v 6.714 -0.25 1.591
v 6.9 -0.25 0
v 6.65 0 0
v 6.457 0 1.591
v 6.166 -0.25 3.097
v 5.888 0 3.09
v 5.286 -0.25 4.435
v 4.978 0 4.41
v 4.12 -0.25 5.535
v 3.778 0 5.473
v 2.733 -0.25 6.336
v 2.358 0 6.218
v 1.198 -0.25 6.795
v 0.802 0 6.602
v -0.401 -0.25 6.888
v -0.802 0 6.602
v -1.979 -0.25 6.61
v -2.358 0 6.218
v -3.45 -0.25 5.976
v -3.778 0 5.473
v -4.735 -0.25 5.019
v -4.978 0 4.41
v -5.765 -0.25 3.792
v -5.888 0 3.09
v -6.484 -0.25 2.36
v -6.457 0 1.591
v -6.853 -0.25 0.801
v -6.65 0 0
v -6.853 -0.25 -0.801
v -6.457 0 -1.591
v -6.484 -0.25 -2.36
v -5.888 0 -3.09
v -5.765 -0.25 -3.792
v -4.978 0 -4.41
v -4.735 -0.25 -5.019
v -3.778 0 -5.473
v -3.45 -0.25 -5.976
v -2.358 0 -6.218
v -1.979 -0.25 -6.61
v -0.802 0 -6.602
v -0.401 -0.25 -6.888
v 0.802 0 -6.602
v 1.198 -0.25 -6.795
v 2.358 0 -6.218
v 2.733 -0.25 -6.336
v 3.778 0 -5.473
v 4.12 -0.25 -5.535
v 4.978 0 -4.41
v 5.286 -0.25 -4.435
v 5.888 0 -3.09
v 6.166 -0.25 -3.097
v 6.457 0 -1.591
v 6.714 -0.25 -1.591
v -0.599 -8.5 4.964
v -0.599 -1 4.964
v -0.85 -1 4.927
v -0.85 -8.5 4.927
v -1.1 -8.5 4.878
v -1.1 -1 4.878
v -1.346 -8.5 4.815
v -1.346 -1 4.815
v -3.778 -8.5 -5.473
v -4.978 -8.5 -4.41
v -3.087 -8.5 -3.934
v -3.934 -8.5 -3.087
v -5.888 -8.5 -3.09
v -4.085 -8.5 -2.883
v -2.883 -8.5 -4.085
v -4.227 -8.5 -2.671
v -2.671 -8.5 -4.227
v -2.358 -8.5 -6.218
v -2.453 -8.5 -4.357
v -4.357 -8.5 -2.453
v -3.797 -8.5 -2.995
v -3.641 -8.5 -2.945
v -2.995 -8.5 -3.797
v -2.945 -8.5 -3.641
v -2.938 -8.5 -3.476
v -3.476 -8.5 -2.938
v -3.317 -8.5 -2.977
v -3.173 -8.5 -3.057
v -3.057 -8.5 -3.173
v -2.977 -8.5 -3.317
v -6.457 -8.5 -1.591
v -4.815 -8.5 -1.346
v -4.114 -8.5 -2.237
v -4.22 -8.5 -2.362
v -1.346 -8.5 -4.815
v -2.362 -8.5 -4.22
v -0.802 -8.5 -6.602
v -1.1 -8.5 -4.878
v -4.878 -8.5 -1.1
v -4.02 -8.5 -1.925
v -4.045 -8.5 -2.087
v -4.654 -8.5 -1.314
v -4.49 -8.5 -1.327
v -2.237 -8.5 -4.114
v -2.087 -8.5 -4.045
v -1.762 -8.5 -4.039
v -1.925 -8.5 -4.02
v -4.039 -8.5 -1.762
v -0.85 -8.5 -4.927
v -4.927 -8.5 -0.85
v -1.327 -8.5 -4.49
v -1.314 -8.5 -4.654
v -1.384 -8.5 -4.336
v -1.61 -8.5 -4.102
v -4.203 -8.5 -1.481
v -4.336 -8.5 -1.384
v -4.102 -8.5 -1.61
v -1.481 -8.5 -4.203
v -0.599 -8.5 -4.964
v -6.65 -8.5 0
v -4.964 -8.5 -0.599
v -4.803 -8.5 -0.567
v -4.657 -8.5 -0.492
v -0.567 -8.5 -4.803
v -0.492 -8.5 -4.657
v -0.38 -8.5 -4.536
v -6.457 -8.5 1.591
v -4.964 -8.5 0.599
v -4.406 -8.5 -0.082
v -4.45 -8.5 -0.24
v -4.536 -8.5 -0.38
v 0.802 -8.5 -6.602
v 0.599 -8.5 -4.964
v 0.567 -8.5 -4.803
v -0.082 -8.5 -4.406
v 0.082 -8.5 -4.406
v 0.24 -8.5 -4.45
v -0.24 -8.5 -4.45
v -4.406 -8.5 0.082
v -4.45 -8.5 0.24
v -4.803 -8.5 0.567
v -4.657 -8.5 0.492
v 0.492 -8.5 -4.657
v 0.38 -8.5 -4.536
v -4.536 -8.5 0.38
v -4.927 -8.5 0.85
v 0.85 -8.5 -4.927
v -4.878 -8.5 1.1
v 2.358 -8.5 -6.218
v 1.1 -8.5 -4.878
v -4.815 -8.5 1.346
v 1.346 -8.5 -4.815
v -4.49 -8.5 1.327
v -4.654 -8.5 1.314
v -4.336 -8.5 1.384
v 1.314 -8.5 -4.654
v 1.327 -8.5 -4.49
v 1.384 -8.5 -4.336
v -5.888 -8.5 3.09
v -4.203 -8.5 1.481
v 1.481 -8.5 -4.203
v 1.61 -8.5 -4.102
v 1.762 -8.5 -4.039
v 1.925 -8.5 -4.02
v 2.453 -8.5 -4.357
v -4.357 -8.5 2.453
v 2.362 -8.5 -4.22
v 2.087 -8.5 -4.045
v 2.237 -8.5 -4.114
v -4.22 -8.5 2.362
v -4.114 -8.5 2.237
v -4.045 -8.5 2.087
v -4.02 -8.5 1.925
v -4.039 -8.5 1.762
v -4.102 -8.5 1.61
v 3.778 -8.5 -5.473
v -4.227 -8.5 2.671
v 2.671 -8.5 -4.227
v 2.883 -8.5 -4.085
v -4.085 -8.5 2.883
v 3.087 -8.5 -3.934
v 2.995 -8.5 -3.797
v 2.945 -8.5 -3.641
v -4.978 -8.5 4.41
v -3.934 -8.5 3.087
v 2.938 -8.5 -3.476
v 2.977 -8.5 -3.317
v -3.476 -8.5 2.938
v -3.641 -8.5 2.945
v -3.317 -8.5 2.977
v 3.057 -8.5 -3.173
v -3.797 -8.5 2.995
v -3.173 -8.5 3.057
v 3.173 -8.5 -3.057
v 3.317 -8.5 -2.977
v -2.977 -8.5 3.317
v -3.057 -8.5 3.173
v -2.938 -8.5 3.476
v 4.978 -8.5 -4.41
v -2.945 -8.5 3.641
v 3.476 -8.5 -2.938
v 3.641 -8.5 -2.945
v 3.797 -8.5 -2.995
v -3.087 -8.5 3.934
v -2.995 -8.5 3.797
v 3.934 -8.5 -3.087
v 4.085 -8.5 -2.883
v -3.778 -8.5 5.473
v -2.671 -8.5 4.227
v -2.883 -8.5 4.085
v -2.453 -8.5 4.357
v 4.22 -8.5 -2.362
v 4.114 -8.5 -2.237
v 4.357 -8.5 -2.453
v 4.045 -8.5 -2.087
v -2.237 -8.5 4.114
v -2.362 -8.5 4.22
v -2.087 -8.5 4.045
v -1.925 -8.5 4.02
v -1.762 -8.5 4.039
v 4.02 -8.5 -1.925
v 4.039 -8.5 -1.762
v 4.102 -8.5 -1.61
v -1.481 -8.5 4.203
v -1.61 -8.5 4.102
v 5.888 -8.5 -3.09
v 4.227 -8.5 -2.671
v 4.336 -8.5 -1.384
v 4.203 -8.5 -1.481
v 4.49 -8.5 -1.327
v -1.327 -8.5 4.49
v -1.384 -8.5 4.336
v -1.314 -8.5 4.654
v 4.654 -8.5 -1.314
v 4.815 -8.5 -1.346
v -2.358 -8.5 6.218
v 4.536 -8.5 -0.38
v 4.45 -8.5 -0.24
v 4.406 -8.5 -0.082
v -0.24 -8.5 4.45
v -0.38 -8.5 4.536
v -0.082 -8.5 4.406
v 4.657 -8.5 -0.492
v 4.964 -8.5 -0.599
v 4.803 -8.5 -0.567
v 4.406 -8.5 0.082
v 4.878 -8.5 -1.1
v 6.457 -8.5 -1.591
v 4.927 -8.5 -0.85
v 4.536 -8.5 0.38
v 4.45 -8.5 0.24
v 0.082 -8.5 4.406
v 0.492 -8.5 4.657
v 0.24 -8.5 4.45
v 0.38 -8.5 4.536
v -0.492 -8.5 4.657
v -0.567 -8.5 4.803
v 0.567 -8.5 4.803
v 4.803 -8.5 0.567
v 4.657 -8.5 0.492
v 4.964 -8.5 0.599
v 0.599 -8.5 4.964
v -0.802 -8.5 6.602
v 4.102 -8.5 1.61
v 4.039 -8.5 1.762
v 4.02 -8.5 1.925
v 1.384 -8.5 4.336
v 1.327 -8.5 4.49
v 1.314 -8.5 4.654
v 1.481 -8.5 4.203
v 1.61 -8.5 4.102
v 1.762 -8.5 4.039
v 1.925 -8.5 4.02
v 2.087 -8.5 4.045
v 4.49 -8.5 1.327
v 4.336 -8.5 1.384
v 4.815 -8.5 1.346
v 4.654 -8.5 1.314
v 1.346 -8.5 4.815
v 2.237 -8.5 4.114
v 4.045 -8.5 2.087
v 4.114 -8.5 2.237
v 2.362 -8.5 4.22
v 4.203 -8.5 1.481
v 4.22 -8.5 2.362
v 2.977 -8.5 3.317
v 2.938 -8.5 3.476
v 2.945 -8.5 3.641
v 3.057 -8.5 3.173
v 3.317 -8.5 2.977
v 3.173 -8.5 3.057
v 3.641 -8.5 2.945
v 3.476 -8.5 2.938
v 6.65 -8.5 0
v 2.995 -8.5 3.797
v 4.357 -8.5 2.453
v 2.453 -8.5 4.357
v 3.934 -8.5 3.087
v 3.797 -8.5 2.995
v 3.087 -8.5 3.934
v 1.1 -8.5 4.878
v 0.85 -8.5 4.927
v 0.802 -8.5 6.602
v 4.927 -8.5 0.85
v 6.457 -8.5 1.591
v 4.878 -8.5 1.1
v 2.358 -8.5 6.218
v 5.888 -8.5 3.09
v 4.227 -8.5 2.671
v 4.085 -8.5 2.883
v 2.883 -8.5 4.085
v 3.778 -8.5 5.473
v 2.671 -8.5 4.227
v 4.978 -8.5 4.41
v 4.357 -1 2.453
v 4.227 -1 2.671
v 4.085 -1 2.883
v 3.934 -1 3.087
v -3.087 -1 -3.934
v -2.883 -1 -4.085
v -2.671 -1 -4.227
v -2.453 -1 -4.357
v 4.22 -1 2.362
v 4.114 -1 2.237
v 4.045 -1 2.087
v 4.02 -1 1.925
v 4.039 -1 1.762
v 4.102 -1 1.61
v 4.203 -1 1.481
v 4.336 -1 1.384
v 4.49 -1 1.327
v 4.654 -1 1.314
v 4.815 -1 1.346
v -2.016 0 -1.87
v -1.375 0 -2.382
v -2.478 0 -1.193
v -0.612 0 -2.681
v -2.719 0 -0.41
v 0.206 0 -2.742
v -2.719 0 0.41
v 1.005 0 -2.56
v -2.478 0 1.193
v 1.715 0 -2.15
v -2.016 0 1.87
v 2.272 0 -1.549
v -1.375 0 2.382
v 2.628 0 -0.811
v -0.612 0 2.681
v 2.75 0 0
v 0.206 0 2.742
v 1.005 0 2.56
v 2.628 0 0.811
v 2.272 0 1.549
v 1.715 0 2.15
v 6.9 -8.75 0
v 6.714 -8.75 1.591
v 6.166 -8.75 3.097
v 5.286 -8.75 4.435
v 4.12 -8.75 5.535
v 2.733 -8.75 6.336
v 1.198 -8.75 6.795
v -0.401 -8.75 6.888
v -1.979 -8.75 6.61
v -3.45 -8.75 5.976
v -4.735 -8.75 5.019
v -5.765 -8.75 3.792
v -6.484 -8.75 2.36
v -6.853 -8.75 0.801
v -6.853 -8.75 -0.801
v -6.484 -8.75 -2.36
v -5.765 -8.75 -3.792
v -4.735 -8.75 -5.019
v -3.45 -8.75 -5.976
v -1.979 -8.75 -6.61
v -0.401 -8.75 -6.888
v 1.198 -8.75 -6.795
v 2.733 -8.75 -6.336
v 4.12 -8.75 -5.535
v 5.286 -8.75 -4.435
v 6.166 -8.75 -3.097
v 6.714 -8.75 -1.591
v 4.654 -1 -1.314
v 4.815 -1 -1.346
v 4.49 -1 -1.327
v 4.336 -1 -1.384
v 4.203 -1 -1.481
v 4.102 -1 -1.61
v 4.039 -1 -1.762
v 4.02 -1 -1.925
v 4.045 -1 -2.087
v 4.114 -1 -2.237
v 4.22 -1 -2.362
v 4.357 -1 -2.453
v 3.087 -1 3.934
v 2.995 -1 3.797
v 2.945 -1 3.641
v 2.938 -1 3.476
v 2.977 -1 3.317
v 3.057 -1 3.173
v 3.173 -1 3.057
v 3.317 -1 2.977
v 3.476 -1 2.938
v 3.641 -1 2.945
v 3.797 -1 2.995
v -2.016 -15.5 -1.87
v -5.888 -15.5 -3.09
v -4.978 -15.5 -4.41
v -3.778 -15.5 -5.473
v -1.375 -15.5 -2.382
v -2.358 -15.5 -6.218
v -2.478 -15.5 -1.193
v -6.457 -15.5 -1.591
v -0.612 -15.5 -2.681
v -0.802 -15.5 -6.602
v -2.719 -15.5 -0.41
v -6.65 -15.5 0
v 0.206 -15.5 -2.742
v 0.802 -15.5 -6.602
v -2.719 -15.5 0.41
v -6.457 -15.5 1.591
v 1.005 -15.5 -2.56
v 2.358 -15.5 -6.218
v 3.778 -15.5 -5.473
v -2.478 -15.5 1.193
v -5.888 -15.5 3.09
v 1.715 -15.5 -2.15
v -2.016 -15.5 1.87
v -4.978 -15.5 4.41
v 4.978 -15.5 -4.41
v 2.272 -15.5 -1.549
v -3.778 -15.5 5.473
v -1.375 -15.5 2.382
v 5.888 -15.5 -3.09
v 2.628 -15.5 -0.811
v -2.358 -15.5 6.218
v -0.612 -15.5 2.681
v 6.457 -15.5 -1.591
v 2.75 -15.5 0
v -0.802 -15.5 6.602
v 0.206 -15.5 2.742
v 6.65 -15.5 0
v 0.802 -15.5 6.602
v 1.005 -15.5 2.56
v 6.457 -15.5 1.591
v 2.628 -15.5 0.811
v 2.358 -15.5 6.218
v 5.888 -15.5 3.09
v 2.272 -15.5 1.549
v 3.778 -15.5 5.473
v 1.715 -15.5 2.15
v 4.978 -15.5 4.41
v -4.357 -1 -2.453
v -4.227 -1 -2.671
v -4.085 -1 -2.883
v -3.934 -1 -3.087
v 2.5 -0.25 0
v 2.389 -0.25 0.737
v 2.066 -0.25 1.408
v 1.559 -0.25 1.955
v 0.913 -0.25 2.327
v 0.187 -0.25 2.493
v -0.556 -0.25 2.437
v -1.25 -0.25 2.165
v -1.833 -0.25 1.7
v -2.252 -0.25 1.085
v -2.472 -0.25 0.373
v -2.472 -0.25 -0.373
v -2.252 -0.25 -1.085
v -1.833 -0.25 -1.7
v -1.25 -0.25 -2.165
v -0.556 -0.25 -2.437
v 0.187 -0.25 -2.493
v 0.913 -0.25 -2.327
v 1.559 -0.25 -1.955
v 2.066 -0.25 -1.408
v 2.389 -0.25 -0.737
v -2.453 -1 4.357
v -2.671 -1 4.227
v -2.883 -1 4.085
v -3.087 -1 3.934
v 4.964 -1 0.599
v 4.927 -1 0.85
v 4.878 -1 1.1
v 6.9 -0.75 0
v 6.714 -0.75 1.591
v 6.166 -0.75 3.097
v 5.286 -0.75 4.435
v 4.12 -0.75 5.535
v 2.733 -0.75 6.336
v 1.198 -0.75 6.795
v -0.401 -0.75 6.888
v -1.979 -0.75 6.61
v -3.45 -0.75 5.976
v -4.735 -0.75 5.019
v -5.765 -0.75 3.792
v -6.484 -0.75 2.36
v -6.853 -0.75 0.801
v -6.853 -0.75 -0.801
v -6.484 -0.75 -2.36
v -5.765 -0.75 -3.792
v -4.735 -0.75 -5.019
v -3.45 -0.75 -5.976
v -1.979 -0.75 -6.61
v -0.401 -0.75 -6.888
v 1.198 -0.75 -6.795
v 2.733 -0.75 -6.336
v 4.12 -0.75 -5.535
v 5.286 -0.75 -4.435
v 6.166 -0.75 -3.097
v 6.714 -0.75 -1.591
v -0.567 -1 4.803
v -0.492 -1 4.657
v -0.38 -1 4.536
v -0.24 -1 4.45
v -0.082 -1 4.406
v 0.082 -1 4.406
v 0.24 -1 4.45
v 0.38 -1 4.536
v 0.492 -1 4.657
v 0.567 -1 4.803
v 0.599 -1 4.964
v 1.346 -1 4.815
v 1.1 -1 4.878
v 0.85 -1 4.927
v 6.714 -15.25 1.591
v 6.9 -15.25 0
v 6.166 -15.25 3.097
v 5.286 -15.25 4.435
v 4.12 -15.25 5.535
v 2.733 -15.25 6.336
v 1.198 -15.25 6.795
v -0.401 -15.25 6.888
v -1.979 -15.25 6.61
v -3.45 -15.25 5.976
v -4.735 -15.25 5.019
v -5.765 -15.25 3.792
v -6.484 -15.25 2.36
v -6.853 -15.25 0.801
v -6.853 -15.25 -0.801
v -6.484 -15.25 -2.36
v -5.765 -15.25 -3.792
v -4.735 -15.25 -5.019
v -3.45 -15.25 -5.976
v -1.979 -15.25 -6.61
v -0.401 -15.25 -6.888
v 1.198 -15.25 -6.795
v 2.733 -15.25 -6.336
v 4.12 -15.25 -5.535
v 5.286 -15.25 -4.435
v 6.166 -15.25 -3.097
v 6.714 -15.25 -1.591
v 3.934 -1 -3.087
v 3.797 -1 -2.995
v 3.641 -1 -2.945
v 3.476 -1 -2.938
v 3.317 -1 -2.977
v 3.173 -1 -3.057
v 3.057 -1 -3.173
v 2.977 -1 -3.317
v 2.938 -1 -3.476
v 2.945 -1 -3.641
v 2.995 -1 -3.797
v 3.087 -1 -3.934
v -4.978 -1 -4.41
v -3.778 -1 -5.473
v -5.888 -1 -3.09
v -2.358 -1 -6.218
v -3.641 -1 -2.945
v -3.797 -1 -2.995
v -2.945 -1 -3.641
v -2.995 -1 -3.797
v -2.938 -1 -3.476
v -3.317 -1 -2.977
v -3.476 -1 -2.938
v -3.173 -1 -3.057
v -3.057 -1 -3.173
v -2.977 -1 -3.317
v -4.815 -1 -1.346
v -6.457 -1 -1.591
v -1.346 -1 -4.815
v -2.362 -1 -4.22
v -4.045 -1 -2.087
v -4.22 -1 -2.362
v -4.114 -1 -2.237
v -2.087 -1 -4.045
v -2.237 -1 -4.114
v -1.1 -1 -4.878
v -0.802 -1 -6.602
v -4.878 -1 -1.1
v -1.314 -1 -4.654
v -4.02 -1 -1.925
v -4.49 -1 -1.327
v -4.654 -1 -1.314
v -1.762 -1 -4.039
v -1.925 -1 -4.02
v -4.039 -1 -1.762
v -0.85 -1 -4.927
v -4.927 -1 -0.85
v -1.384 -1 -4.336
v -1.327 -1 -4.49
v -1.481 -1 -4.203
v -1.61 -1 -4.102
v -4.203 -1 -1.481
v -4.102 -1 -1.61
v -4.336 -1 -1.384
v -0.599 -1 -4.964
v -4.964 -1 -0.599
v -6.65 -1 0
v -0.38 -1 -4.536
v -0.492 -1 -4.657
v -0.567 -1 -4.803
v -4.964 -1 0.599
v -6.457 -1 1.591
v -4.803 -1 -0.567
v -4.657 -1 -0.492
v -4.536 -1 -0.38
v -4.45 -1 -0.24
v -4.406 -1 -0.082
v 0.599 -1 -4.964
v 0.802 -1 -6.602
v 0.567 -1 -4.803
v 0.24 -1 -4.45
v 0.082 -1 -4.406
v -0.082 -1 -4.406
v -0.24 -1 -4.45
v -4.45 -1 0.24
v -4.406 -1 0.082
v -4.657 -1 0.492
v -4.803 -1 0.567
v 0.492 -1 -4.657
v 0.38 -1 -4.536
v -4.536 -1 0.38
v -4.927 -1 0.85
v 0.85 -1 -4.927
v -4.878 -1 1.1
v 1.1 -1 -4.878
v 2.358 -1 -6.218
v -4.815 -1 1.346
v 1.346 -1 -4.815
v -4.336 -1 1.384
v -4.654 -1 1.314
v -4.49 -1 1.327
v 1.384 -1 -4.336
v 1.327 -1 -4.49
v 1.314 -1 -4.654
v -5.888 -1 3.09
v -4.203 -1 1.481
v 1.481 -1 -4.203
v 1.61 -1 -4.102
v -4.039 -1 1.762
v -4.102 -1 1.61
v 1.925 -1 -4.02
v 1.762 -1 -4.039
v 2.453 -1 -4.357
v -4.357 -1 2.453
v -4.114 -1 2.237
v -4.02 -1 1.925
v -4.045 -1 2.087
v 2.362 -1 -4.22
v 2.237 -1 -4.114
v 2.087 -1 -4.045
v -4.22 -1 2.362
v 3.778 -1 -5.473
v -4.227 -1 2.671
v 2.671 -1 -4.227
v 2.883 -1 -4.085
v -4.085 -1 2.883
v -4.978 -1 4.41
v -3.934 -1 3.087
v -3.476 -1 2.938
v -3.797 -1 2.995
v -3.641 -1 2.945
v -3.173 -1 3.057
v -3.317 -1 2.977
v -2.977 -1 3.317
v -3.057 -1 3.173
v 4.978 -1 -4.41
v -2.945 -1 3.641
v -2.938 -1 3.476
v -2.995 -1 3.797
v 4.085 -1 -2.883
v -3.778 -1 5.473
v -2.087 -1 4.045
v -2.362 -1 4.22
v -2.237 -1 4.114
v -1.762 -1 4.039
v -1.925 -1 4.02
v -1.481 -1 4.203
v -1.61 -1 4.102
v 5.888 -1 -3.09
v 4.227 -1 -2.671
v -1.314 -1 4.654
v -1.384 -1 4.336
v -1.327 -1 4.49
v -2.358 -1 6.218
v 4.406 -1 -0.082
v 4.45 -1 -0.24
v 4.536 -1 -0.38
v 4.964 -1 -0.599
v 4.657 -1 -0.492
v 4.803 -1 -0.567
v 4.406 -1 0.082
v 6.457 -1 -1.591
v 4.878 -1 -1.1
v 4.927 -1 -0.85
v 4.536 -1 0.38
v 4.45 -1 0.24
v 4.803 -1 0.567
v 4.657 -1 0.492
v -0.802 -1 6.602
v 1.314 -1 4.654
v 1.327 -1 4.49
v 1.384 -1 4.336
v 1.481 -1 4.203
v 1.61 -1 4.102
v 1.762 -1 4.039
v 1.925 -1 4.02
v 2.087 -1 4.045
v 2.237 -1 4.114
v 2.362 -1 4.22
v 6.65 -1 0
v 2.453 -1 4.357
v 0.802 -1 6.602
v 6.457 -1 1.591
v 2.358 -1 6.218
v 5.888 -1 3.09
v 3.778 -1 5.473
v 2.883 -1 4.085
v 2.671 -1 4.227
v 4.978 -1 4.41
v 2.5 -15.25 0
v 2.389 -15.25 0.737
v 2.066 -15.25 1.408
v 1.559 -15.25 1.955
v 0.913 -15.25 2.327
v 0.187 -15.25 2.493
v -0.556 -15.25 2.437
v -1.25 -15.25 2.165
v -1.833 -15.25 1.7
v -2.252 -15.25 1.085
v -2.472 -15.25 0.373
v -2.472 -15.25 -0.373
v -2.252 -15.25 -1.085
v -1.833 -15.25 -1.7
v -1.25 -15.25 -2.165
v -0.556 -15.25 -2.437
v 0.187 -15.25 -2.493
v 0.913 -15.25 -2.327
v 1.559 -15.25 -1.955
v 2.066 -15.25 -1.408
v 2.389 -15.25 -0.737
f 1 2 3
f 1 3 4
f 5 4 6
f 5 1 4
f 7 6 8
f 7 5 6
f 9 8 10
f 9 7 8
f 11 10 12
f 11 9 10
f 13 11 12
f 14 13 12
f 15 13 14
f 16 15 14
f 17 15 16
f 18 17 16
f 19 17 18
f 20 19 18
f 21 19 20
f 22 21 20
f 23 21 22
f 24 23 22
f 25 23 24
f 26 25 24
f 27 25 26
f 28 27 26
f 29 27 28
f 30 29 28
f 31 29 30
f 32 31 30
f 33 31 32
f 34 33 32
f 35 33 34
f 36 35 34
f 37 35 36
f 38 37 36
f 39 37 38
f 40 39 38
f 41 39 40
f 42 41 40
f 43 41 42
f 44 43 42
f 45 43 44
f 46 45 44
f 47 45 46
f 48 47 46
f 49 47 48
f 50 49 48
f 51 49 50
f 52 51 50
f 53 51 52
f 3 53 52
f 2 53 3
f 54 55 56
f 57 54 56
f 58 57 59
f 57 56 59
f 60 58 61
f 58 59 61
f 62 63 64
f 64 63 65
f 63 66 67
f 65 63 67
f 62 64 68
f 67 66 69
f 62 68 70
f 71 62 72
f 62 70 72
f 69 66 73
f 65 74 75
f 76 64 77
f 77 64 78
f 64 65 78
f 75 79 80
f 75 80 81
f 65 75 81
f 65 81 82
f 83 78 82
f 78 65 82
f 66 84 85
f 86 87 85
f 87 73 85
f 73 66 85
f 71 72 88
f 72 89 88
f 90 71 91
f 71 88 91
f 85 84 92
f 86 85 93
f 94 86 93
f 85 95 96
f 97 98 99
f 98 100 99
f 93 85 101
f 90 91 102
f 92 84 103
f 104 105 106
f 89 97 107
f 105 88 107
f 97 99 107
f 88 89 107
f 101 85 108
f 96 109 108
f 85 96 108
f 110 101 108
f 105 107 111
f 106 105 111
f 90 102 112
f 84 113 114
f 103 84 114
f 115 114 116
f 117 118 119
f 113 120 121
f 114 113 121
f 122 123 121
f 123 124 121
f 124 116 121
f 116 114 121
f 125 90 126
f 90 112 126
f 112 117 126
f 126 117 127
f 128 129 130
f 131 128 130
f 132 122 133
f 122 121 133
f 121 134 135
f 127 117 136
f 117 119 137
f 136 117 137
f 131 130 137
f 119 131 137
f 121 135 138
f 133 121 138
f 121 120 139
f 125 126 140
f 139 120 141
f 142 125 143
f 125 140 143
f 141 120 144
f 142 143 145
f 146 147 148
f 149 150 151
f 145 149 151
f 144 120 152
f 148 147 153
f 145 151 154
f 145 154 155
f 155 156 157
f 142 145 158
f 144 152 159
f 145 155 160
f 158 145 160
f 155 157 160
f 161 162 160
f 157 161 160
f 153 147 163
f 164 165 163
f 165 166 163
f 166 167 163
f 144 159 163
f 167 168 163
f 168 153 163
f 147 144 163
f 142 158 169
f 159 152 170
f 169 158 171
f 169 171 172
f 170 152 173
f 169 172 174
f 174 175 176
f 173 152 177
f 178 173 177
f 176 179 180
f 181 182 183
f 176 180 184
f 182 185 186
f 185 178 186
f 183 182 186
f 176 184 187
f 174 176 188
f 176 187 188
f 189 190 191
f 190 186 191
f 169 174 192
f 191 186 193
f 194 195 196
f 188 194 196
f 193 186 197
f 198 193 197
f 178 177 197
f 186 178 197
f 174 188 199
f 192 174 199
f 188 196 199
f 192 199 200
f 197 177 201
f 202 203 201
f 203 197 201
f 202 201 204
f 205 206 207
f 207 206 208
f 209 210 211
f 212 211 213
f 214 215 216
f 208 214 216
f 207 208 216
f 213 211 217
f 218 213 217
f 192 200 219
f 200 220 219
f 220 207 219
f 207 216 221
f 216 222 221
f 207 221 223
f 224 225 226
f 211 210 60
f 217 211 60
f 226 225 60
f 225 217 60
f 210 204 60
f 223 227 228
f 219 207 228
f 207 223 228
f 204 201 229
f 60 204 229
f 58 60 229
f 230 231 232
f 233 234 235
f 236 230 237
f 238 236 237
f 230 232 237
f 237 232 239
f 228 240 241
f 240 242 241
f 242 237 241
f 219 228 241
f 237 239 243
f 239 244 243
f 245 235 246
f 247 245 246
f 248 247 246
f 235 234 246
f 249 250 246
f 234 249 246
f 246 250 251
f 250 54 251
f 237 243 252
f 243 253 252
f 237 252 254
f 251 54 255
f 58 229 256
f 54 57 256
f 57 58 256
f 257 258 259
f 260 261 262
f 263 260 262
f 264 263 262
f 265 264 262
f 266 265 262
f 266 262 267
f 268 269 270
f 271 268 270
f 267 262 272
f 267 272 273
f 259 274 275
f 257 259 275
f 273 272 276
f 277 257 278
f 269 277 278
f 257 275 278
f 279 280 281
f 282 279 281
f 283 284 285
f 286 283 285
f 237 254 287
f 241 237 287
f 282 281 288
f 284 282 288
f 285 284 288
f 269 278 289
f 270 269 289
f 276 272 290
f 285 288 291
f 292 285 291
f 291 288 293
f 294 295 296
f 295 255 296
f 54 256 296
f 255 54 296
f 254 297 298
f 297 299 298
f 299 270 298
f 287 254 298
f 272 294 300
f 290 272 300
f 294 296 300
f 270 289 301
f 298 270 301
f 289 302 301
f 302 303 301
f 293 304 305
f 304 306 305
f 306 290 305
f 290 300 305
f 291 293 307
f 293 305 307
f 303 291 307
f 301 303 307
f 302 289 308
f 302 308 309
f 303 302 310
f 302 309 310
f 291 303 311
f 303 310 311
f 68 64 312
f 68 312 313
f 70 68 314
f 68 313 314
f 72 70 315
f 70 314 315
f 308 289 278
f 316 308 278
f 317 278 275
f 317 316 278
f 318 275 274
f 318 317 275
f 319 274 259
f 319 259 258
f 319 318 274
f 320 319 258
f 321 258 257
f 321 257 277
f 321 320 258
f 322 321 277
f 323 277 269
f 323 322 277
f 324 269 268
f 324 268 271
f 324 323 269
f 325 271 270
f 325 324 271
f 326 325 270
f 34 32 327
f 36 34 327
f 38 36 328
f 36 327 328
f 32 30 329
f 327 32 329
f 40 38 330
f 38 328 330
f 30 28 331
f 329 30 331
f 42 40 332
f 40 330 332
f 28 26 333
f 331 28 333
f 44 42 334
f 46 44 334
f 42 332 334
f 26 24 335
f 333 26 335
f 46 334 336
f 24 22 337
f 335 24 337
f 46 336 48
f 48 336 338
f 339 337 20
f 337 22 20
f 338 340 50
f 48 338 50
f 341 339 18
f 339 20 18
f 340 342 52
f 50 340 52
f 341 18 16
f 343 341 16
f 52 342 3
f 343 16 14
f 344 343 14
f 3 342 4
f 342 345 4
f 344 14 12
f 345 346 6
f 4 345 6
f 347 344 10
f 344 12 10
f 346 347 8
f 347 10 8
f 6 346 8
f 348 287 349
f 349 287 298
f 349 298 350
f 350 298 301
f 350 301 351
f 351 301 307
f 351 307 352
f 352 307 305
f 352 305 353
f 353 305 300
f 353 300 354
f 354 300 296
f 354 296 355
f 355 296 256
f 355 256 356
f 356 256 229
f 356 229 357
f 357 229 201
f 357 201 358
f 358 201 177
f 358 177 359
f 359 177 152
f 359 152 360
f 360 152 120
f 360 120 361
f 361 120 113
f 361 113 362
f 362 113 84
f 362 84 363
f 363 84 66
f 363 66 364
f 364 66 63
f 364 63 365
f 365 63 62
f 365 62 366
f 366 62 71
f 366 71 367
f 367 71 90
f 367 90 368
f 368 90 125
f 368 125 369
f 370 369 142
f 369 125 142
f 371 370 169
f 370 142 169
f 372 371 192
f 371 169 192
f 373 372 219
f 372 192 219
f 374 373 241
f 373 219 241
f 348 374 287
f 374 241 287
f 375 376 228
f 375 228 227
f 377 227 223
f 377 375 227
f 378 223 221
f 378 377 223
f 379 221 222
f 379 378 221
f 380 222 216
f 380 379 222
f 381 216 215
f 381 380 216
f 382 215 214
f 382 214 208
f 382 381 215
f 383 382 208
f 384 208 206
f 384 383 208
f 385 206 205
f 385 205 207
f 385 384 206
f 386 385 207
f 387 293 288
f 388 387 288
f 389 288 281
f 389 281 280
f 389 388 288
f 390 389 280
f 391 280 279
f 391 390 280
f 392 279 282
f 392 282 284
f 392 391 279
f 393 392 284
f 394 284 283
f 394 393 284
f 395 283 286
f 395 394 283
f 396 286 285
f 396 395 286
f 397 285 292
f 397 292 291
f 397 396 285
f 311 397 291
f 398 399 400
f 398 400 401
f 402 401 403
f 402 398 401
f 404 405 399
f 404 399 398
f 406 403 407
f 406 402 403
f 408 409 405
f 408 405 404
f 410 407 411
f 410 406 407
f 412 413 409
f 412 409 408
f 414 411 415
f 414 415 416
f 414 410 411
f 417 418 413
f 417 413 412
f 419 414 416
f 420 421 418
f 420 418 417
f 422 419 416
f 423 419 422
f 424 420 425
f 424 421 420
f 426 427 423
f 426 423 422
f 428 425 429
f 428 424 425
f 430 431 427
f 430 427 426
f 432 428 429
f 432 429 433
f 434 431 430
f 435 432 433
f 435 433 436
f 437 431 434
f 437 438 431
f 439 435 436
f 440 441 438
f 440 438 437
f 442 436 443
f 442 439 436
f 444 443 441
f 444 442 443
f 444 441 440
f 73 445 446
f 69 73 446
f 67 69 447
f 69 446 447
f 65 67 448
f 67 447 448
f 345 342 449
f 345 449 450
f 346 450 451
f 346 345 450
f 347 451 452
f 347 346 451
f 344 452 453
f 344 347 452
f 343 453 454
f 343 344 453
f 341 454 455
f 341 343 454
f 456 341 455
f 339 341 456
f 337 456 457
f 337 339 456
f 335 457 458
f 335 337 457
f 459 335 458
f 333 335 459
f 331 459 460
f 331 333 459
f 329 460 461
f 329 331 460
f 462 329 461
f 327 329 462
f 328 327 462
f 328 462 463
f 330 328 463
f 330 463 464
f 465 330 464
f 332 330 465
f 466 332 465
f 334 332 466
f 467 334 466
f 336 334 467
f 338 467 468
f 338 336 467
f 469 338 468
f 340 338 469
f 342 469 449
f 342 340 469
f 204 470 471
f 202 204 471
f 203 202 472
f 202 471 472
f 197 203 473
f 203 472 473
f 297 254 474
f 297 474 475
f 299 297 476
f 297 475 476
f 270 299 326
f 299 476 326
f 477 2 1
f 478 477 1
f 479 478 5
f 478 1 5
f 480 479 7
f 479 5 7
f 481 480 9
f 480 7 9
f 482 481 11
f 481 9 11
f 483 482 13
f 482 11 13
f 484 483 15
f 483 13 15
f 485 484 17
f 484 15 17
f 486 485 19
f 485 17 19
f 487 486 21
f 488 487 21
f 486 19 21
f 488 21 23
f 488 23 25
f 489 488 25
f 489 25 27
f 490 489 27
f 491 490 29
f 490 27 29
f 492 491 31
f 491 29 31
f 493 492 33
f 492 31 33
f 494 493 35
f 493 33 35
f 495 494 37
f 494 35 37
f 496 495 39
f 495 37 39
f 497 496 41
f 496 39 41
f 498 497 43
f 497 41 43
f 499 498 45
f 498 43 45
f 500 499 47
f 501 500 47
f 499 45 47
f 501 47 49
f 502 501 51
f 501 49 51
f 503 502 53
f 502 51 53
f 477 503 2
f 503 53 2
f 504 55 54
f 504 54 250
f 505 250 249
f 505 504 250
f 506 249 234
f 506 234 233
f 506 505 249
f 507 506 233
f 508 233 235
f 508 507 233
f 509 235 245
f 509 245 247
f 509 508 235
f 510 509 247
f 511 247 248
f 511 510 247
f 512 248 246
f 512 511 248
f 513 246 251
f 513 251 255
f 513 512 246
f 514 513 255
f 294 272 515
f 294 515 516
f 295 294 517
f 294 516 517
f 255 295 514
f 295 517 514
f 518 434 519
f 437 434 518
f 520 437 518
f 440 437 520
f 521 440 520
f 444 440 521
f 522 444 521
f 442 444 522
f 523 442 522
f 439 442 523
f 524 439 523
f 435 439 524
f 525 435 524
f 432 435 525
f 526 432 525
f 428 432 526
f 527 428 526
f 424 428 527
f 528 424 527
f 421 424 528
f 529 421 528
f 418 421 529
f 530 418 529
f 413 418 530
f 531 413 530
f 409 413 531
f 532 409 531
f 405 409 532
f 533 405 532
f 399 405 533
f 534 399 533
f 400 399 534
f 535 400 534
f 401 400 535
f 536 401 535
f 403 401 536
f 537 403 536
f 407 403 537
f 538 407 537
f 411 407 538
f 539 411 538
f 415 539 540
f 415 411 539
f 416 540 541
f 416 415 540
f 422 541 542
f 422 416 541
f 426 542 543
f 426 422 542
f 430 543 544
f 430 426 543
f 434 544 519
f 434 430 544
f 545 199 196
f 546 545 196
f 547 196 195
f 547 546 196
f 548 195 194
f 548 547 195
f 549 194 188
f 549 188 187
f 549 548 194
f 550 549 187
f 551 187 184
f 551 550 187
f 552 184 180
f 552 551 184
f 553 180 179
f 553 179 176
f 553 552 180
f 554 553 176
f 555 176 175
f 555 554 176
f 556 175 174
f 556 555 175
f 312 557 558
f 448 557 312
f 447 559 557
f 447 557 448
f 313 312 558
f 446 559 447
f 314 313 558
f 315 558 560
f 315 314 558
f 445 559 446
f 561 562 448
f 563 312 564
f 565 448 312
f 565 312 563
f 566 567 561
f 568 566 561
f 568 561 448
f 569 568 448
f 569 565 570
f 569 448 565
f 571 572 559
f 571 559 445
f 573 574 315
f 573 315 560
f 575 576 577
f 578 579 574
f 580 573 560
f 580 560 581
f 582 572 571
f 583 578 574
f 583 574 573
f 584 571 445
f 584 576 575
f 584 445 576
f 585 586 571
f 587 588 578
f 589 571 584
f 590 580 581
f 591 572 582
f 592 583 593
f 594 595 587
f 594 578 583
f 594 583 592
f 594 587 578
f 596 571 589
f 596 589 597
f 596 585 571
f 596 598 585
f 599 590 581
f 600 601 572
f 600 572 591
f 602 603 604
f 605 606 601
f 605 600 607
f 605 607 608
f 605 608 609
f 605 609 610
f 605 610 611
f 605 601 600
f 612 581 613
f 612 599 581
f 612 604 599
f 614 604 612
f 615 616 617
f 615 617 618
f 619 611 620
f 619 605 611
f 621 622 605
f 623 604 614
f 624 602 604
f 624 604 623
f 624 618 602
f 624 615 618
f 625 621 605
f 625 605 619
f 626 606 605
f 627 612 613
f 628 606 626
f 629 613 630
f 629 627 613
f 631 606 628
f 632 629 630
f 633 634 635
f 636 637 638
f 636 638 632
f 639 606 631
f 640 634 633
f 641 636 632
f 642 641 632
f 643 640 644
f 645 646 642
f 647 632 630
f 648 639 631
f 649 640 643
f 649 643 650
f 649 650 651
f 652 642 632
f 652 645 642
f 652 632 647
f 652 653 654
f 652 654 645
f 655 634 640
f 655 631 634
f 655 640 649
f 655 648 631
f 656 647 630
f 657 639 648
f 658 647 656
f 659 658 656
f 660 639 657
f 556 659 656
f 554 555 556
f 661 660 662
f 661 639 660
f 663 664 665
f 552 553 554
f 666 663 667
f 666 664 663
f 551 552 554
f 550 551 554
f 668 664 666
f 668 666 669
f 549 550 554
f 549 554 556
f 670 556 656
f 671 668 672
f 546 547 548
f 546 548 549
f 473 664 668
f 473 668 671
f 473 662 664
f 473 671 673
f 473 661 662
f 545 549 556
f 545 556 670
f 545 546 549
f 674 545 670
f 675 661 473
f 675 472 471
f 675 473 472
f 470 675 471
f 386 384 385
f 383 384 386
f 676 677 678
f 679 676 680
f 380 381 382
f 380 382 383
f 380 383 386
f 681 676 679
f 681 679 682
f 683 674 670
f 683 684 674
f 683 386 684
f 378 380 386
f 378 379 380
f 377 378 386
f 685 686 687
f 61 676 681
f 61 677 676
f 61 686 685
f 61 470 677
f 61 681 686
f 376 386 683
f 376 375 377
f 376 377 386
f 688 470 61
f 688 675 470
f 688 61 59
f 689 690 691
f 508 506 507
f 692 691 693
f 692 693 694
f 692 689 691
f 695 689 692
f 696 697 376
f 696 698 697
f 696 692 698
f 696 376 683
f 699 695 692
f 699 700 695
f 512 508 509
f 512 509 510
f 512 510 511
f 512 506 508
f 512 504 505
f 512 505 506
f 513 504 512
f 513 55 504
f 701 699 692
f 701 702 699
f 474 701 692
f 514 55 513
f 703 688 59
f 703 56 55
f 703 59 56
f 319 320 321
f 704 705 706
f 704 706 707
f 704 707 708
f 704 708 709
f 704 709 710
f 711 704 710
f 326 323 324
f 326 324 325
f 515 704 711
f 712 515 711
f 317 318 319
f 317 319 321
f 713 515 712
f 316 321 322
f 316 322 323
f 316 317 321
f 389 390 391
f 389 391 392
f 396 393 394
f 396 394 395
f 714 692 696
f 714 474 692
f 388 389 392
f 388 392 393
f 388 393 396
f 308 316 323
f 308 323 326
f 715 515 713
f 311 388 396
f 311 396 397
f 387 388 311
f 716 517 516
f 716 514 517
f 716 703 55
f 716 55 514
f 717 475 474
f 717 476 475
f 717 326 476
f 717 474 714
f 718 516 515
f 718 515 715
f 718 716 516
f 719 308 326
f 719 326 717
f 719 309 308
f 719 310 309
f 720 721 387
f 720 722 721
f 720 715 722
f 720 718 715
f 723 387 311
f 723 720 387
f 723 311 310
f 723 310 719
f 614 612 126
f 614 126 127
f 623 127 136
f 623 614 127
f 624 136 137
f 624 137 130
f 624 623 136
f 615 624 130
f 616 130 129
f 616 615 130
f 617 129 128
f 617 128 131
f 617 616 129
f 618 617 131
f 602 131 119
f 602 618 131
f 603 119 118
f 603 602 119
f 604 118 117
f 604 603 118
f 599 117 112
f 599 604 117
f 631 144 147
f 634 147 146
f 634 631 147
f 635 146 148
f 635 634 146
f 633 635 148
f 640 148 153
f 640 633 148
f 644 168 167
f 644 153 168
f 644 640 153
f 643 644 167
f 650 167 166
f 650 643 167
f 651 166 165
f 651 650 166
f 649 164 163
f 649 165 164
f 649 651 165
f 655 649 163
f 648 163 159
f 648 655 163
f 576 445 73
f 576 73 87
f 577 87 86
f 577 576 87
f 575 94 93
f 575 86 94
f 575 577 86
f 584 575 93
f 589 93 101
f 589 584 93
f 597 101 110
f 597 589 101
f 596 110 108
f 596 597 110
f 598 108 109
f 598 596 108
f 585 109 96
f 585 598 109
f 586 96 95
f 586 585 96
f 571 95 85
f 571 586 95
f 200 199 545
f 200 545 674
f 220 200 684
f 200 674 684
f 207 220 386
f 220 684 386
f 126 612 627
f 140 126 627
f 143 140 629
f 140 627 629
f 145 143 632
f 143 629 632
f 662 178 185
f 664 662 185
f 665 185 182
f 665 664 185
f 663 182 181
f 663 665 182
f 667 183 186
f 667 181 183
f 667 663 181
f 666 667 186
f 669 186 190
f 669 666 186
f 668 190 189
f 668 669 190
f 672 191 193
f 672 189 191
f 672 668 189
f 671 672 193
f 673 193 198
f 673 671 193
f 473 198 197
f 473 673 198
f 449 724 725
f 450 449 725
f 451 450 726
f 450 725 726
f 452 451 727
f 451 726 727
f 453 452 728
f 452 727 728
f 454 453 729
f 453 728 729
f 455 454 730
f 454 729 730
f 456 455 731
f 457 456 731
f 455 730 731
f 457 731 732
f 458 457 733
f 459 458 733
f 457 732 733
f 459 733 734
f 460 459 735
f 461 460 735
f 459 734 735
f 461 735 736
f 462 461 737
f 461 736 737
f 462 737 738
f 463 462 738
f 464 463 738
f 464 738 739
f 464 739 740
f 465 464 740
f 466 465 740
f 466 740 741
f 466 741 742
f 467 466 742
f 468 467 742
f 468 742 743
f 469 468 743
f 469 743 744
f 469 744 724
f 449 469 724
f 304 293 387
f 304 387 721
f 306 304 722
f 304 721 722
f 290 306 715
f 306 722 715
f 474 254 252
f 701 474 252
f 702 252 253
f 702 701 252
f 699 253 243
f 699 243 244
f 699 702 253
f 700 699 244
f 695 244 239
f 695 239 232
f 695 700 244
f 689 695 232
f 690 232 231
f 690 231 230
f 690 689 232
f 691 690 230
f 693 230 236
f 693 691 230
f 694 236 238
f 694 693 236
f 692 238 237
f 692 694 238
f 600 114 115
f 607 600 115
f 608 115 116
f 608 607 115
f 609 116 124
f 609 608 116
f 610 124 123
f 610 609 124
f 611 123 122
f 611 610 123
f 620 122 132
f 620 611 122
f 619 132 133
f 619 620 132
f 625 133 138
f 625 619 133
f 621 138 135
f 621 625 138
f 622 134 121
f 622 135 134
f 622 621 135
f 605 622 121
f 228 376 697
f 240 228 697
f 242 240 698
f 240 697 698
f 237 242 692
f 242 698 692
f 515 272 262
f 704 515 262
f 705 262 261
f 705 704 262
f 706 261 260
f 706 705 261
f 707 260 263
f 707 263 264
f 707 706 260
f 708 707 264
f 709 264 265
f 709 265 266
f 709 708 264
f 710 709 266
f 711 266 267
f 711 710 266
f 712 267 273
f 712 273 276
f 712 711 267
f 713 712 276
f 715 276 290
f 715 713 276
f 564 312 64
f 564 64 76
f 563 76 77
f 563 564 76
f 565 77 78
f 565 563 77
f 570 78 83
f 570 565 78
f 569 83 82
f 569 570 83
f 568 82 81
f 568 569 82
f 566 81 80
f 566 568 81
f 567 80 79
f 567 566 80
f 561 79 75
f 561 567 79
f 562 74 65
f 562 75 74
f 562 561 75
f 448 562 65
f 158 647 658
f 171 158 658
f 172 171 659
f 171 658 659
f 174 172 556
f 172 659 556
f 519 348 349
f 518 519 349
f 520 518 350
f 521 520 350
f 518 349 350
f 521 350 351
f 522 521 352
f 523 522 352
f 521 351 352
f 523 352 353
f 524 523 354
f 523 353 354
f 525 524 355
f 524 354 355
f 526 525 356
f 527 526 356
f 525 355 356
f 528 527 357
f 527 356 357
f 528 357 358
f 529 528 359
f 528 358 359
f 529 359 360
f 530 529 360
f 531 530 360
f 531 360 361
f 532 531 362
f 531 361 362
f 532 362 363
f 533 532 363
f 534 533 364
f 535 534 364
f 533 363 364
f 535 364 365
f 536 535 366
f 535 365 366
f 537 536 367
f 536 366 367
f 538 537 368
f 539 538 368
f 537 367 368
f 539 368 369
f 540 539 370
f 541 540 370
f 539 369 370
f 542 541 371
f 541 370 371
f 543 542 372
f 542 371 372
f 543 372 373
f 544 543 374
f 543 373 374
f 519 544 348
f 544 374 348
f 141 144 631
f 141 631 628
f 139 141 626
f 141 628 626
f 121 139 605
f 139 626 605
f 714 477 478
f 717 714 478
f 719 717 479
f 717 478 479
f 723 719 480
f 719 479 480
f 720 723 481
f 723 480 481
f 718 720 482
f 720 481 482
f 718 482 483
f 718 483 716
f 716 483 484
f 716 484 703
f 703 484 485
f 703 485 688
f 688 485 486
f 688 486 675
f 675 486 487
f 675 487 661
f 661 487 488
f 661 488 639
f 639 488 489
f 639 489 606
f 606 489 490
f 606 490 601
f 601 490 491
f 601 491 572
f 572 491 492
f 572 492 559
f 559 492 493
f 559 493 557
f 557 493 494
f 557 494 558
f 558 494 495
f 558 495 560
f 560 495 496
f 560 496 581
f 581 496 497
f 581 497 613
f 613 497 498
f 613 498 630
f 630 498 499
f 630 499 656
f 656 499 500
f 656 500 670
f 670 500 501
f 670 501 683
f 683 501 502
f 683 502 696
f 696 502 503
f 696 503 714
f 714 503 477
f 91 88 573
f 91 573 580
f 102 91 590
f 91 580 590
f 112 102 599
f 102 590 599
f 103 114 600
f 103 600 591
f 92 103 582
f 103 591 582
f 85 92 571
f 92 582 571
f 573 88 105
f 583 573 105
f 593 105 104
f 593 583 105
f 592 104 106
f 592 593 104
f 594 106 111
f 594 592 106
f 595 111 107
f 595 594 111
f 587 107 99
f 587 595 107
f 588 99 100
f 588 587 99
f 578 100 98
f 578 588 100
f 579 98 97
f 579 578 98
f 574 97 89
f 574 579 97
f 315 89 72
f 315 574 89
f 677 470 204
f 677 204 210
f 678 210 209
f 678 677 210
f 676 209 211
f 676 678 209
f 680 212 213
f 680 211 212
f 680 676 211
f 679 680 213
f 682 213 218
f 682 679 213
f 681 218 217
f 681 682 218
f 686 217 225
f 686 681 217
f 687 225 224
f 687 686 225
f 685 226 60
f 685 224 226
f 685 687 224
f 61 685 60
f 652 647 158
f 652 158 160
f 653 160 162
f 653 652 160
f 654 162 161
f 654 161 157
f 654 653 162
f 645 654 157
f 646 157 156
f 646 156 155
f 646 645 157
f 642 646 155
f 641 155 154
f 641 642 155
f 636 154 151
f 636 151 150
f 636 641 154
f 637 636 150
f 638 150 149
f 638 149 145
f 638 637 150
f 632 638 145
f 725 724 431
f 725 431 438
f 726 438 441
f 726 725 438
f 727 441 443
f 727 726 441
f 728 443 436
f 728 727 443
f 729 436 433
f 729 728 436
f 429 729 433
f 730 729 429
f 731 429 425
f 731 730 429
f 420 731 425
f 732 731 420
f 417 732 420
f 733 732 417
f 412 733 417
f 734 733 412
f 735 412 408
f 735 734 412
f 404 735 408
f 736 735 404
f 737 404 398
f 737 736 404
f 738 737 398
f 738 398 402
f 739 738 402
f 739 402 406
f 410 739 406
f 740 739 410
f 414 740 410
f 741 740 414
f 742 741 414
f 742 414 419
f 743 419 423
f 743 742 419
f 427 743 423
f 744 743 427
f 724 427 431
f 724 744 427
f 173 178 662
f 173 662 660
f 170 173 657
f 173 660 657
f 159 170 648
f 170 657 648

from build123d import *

# Parameters (mm, degrees)
F0_R     = 6.9
F1_DEPTH = 1
F2_R     = 5
F3_DEPTH = 7.5
F4_R     = 6.9
F5_DEPTH = 7
F6_R     = 0.6
F7_DEPTH = 7.5
F8_R     = 2.5
F9_DEPTH = 15.501
F10_SIZE = 0.25


with BuildPart() as f1:
    # F0 (on Front) → F1 (new body)
    with BuildSketch(Plane.XZ):
        Circle(F0_R)
    extrude(amount=F1_DEPTH)

    # F2 (on face) → F3 (join)
    with BuildSketch(Plane.XZ.offset(1)):
        Circle(F2_R)
    extrude(amount=F3_DEPTH)

    # F4 (on face) → F5 (join)
    with BuildSketch(Plane.XZ.offset(8.5)):
        Circle(F4_R)
    extrude(amount=F5_DEPTH)

    # F6 (on face) → F7 (cut, through all)
    with BuildSketch(Plane.XZ.offset(1)):
        with Locations((0, 5)):
            Circle(F6_R)
        with Locations((-1.913417, 4.619398)):
            Circle(F6_R)
        with Locations((-3.535534, 3.535534)):
            Circle(F6_R)
        with Locations((-4.619398, 1.913417)):
            Circle(F6_R)
        with Locations((-5, 0)):
            Circle(F6_R)
        with Locations((-4.619398, -1.913417)):
            Circle(F6_R)
        with Locations((-3.535534, -3.535534)):
            Circle(F6_R)
        with Locations((-1.913417, -4.619398)):
            Circle(F6_R)
        with Locations((0, -5)):
            Circle(F6_R)
        with Locations((1.913417, -4.619398)):
            Circle(F6_R)
        with Locations((3.535534, -3.535534)):
            Circle(F6_R)
        with Locations((4.619398, -1.913417)):
            Circle(F6_R)
        with Locations((5, 0)):
            Circle(F6_R)
        with Locations((4.619398, 1.913417)):
            Circle(F6_R)
        with Locations((3.535534, 3.535534)):
            Circle(F6_R)
        with Locations((1.913417, 4.619398)):
            Circle(F6_R)
    extrude(amount=F7_DEPTH, mode=Mode.SUBTRACT)

    # F8 (on face) → F9 (cut, through all)
    with BuildSketch(Plane.XZ.offset(15.5)):
        Circle(F8_R)
    extrude(amount=-F9_DEPTH, mode=Mode.SUBTRACT)

    # F10
    f10_edges = [f1.edges().sort_by_distance(p)[0] for p in [
        (6.9, -12, 0),
        (-6.9, -8.5, 0),
        (-6.9, -15.5, 0),
        (6.9, -0.5, 0),
        (-6.9, 0, 0),
        (-6.9, -1, 0),
        (-2.5, -15.5, 0),
        (2.5, -7.75, 0),
        (-2.5, 0, 0),
    ]]
    chamfer(f10_edges, length=F10_SIZE)


solid = f1.part
